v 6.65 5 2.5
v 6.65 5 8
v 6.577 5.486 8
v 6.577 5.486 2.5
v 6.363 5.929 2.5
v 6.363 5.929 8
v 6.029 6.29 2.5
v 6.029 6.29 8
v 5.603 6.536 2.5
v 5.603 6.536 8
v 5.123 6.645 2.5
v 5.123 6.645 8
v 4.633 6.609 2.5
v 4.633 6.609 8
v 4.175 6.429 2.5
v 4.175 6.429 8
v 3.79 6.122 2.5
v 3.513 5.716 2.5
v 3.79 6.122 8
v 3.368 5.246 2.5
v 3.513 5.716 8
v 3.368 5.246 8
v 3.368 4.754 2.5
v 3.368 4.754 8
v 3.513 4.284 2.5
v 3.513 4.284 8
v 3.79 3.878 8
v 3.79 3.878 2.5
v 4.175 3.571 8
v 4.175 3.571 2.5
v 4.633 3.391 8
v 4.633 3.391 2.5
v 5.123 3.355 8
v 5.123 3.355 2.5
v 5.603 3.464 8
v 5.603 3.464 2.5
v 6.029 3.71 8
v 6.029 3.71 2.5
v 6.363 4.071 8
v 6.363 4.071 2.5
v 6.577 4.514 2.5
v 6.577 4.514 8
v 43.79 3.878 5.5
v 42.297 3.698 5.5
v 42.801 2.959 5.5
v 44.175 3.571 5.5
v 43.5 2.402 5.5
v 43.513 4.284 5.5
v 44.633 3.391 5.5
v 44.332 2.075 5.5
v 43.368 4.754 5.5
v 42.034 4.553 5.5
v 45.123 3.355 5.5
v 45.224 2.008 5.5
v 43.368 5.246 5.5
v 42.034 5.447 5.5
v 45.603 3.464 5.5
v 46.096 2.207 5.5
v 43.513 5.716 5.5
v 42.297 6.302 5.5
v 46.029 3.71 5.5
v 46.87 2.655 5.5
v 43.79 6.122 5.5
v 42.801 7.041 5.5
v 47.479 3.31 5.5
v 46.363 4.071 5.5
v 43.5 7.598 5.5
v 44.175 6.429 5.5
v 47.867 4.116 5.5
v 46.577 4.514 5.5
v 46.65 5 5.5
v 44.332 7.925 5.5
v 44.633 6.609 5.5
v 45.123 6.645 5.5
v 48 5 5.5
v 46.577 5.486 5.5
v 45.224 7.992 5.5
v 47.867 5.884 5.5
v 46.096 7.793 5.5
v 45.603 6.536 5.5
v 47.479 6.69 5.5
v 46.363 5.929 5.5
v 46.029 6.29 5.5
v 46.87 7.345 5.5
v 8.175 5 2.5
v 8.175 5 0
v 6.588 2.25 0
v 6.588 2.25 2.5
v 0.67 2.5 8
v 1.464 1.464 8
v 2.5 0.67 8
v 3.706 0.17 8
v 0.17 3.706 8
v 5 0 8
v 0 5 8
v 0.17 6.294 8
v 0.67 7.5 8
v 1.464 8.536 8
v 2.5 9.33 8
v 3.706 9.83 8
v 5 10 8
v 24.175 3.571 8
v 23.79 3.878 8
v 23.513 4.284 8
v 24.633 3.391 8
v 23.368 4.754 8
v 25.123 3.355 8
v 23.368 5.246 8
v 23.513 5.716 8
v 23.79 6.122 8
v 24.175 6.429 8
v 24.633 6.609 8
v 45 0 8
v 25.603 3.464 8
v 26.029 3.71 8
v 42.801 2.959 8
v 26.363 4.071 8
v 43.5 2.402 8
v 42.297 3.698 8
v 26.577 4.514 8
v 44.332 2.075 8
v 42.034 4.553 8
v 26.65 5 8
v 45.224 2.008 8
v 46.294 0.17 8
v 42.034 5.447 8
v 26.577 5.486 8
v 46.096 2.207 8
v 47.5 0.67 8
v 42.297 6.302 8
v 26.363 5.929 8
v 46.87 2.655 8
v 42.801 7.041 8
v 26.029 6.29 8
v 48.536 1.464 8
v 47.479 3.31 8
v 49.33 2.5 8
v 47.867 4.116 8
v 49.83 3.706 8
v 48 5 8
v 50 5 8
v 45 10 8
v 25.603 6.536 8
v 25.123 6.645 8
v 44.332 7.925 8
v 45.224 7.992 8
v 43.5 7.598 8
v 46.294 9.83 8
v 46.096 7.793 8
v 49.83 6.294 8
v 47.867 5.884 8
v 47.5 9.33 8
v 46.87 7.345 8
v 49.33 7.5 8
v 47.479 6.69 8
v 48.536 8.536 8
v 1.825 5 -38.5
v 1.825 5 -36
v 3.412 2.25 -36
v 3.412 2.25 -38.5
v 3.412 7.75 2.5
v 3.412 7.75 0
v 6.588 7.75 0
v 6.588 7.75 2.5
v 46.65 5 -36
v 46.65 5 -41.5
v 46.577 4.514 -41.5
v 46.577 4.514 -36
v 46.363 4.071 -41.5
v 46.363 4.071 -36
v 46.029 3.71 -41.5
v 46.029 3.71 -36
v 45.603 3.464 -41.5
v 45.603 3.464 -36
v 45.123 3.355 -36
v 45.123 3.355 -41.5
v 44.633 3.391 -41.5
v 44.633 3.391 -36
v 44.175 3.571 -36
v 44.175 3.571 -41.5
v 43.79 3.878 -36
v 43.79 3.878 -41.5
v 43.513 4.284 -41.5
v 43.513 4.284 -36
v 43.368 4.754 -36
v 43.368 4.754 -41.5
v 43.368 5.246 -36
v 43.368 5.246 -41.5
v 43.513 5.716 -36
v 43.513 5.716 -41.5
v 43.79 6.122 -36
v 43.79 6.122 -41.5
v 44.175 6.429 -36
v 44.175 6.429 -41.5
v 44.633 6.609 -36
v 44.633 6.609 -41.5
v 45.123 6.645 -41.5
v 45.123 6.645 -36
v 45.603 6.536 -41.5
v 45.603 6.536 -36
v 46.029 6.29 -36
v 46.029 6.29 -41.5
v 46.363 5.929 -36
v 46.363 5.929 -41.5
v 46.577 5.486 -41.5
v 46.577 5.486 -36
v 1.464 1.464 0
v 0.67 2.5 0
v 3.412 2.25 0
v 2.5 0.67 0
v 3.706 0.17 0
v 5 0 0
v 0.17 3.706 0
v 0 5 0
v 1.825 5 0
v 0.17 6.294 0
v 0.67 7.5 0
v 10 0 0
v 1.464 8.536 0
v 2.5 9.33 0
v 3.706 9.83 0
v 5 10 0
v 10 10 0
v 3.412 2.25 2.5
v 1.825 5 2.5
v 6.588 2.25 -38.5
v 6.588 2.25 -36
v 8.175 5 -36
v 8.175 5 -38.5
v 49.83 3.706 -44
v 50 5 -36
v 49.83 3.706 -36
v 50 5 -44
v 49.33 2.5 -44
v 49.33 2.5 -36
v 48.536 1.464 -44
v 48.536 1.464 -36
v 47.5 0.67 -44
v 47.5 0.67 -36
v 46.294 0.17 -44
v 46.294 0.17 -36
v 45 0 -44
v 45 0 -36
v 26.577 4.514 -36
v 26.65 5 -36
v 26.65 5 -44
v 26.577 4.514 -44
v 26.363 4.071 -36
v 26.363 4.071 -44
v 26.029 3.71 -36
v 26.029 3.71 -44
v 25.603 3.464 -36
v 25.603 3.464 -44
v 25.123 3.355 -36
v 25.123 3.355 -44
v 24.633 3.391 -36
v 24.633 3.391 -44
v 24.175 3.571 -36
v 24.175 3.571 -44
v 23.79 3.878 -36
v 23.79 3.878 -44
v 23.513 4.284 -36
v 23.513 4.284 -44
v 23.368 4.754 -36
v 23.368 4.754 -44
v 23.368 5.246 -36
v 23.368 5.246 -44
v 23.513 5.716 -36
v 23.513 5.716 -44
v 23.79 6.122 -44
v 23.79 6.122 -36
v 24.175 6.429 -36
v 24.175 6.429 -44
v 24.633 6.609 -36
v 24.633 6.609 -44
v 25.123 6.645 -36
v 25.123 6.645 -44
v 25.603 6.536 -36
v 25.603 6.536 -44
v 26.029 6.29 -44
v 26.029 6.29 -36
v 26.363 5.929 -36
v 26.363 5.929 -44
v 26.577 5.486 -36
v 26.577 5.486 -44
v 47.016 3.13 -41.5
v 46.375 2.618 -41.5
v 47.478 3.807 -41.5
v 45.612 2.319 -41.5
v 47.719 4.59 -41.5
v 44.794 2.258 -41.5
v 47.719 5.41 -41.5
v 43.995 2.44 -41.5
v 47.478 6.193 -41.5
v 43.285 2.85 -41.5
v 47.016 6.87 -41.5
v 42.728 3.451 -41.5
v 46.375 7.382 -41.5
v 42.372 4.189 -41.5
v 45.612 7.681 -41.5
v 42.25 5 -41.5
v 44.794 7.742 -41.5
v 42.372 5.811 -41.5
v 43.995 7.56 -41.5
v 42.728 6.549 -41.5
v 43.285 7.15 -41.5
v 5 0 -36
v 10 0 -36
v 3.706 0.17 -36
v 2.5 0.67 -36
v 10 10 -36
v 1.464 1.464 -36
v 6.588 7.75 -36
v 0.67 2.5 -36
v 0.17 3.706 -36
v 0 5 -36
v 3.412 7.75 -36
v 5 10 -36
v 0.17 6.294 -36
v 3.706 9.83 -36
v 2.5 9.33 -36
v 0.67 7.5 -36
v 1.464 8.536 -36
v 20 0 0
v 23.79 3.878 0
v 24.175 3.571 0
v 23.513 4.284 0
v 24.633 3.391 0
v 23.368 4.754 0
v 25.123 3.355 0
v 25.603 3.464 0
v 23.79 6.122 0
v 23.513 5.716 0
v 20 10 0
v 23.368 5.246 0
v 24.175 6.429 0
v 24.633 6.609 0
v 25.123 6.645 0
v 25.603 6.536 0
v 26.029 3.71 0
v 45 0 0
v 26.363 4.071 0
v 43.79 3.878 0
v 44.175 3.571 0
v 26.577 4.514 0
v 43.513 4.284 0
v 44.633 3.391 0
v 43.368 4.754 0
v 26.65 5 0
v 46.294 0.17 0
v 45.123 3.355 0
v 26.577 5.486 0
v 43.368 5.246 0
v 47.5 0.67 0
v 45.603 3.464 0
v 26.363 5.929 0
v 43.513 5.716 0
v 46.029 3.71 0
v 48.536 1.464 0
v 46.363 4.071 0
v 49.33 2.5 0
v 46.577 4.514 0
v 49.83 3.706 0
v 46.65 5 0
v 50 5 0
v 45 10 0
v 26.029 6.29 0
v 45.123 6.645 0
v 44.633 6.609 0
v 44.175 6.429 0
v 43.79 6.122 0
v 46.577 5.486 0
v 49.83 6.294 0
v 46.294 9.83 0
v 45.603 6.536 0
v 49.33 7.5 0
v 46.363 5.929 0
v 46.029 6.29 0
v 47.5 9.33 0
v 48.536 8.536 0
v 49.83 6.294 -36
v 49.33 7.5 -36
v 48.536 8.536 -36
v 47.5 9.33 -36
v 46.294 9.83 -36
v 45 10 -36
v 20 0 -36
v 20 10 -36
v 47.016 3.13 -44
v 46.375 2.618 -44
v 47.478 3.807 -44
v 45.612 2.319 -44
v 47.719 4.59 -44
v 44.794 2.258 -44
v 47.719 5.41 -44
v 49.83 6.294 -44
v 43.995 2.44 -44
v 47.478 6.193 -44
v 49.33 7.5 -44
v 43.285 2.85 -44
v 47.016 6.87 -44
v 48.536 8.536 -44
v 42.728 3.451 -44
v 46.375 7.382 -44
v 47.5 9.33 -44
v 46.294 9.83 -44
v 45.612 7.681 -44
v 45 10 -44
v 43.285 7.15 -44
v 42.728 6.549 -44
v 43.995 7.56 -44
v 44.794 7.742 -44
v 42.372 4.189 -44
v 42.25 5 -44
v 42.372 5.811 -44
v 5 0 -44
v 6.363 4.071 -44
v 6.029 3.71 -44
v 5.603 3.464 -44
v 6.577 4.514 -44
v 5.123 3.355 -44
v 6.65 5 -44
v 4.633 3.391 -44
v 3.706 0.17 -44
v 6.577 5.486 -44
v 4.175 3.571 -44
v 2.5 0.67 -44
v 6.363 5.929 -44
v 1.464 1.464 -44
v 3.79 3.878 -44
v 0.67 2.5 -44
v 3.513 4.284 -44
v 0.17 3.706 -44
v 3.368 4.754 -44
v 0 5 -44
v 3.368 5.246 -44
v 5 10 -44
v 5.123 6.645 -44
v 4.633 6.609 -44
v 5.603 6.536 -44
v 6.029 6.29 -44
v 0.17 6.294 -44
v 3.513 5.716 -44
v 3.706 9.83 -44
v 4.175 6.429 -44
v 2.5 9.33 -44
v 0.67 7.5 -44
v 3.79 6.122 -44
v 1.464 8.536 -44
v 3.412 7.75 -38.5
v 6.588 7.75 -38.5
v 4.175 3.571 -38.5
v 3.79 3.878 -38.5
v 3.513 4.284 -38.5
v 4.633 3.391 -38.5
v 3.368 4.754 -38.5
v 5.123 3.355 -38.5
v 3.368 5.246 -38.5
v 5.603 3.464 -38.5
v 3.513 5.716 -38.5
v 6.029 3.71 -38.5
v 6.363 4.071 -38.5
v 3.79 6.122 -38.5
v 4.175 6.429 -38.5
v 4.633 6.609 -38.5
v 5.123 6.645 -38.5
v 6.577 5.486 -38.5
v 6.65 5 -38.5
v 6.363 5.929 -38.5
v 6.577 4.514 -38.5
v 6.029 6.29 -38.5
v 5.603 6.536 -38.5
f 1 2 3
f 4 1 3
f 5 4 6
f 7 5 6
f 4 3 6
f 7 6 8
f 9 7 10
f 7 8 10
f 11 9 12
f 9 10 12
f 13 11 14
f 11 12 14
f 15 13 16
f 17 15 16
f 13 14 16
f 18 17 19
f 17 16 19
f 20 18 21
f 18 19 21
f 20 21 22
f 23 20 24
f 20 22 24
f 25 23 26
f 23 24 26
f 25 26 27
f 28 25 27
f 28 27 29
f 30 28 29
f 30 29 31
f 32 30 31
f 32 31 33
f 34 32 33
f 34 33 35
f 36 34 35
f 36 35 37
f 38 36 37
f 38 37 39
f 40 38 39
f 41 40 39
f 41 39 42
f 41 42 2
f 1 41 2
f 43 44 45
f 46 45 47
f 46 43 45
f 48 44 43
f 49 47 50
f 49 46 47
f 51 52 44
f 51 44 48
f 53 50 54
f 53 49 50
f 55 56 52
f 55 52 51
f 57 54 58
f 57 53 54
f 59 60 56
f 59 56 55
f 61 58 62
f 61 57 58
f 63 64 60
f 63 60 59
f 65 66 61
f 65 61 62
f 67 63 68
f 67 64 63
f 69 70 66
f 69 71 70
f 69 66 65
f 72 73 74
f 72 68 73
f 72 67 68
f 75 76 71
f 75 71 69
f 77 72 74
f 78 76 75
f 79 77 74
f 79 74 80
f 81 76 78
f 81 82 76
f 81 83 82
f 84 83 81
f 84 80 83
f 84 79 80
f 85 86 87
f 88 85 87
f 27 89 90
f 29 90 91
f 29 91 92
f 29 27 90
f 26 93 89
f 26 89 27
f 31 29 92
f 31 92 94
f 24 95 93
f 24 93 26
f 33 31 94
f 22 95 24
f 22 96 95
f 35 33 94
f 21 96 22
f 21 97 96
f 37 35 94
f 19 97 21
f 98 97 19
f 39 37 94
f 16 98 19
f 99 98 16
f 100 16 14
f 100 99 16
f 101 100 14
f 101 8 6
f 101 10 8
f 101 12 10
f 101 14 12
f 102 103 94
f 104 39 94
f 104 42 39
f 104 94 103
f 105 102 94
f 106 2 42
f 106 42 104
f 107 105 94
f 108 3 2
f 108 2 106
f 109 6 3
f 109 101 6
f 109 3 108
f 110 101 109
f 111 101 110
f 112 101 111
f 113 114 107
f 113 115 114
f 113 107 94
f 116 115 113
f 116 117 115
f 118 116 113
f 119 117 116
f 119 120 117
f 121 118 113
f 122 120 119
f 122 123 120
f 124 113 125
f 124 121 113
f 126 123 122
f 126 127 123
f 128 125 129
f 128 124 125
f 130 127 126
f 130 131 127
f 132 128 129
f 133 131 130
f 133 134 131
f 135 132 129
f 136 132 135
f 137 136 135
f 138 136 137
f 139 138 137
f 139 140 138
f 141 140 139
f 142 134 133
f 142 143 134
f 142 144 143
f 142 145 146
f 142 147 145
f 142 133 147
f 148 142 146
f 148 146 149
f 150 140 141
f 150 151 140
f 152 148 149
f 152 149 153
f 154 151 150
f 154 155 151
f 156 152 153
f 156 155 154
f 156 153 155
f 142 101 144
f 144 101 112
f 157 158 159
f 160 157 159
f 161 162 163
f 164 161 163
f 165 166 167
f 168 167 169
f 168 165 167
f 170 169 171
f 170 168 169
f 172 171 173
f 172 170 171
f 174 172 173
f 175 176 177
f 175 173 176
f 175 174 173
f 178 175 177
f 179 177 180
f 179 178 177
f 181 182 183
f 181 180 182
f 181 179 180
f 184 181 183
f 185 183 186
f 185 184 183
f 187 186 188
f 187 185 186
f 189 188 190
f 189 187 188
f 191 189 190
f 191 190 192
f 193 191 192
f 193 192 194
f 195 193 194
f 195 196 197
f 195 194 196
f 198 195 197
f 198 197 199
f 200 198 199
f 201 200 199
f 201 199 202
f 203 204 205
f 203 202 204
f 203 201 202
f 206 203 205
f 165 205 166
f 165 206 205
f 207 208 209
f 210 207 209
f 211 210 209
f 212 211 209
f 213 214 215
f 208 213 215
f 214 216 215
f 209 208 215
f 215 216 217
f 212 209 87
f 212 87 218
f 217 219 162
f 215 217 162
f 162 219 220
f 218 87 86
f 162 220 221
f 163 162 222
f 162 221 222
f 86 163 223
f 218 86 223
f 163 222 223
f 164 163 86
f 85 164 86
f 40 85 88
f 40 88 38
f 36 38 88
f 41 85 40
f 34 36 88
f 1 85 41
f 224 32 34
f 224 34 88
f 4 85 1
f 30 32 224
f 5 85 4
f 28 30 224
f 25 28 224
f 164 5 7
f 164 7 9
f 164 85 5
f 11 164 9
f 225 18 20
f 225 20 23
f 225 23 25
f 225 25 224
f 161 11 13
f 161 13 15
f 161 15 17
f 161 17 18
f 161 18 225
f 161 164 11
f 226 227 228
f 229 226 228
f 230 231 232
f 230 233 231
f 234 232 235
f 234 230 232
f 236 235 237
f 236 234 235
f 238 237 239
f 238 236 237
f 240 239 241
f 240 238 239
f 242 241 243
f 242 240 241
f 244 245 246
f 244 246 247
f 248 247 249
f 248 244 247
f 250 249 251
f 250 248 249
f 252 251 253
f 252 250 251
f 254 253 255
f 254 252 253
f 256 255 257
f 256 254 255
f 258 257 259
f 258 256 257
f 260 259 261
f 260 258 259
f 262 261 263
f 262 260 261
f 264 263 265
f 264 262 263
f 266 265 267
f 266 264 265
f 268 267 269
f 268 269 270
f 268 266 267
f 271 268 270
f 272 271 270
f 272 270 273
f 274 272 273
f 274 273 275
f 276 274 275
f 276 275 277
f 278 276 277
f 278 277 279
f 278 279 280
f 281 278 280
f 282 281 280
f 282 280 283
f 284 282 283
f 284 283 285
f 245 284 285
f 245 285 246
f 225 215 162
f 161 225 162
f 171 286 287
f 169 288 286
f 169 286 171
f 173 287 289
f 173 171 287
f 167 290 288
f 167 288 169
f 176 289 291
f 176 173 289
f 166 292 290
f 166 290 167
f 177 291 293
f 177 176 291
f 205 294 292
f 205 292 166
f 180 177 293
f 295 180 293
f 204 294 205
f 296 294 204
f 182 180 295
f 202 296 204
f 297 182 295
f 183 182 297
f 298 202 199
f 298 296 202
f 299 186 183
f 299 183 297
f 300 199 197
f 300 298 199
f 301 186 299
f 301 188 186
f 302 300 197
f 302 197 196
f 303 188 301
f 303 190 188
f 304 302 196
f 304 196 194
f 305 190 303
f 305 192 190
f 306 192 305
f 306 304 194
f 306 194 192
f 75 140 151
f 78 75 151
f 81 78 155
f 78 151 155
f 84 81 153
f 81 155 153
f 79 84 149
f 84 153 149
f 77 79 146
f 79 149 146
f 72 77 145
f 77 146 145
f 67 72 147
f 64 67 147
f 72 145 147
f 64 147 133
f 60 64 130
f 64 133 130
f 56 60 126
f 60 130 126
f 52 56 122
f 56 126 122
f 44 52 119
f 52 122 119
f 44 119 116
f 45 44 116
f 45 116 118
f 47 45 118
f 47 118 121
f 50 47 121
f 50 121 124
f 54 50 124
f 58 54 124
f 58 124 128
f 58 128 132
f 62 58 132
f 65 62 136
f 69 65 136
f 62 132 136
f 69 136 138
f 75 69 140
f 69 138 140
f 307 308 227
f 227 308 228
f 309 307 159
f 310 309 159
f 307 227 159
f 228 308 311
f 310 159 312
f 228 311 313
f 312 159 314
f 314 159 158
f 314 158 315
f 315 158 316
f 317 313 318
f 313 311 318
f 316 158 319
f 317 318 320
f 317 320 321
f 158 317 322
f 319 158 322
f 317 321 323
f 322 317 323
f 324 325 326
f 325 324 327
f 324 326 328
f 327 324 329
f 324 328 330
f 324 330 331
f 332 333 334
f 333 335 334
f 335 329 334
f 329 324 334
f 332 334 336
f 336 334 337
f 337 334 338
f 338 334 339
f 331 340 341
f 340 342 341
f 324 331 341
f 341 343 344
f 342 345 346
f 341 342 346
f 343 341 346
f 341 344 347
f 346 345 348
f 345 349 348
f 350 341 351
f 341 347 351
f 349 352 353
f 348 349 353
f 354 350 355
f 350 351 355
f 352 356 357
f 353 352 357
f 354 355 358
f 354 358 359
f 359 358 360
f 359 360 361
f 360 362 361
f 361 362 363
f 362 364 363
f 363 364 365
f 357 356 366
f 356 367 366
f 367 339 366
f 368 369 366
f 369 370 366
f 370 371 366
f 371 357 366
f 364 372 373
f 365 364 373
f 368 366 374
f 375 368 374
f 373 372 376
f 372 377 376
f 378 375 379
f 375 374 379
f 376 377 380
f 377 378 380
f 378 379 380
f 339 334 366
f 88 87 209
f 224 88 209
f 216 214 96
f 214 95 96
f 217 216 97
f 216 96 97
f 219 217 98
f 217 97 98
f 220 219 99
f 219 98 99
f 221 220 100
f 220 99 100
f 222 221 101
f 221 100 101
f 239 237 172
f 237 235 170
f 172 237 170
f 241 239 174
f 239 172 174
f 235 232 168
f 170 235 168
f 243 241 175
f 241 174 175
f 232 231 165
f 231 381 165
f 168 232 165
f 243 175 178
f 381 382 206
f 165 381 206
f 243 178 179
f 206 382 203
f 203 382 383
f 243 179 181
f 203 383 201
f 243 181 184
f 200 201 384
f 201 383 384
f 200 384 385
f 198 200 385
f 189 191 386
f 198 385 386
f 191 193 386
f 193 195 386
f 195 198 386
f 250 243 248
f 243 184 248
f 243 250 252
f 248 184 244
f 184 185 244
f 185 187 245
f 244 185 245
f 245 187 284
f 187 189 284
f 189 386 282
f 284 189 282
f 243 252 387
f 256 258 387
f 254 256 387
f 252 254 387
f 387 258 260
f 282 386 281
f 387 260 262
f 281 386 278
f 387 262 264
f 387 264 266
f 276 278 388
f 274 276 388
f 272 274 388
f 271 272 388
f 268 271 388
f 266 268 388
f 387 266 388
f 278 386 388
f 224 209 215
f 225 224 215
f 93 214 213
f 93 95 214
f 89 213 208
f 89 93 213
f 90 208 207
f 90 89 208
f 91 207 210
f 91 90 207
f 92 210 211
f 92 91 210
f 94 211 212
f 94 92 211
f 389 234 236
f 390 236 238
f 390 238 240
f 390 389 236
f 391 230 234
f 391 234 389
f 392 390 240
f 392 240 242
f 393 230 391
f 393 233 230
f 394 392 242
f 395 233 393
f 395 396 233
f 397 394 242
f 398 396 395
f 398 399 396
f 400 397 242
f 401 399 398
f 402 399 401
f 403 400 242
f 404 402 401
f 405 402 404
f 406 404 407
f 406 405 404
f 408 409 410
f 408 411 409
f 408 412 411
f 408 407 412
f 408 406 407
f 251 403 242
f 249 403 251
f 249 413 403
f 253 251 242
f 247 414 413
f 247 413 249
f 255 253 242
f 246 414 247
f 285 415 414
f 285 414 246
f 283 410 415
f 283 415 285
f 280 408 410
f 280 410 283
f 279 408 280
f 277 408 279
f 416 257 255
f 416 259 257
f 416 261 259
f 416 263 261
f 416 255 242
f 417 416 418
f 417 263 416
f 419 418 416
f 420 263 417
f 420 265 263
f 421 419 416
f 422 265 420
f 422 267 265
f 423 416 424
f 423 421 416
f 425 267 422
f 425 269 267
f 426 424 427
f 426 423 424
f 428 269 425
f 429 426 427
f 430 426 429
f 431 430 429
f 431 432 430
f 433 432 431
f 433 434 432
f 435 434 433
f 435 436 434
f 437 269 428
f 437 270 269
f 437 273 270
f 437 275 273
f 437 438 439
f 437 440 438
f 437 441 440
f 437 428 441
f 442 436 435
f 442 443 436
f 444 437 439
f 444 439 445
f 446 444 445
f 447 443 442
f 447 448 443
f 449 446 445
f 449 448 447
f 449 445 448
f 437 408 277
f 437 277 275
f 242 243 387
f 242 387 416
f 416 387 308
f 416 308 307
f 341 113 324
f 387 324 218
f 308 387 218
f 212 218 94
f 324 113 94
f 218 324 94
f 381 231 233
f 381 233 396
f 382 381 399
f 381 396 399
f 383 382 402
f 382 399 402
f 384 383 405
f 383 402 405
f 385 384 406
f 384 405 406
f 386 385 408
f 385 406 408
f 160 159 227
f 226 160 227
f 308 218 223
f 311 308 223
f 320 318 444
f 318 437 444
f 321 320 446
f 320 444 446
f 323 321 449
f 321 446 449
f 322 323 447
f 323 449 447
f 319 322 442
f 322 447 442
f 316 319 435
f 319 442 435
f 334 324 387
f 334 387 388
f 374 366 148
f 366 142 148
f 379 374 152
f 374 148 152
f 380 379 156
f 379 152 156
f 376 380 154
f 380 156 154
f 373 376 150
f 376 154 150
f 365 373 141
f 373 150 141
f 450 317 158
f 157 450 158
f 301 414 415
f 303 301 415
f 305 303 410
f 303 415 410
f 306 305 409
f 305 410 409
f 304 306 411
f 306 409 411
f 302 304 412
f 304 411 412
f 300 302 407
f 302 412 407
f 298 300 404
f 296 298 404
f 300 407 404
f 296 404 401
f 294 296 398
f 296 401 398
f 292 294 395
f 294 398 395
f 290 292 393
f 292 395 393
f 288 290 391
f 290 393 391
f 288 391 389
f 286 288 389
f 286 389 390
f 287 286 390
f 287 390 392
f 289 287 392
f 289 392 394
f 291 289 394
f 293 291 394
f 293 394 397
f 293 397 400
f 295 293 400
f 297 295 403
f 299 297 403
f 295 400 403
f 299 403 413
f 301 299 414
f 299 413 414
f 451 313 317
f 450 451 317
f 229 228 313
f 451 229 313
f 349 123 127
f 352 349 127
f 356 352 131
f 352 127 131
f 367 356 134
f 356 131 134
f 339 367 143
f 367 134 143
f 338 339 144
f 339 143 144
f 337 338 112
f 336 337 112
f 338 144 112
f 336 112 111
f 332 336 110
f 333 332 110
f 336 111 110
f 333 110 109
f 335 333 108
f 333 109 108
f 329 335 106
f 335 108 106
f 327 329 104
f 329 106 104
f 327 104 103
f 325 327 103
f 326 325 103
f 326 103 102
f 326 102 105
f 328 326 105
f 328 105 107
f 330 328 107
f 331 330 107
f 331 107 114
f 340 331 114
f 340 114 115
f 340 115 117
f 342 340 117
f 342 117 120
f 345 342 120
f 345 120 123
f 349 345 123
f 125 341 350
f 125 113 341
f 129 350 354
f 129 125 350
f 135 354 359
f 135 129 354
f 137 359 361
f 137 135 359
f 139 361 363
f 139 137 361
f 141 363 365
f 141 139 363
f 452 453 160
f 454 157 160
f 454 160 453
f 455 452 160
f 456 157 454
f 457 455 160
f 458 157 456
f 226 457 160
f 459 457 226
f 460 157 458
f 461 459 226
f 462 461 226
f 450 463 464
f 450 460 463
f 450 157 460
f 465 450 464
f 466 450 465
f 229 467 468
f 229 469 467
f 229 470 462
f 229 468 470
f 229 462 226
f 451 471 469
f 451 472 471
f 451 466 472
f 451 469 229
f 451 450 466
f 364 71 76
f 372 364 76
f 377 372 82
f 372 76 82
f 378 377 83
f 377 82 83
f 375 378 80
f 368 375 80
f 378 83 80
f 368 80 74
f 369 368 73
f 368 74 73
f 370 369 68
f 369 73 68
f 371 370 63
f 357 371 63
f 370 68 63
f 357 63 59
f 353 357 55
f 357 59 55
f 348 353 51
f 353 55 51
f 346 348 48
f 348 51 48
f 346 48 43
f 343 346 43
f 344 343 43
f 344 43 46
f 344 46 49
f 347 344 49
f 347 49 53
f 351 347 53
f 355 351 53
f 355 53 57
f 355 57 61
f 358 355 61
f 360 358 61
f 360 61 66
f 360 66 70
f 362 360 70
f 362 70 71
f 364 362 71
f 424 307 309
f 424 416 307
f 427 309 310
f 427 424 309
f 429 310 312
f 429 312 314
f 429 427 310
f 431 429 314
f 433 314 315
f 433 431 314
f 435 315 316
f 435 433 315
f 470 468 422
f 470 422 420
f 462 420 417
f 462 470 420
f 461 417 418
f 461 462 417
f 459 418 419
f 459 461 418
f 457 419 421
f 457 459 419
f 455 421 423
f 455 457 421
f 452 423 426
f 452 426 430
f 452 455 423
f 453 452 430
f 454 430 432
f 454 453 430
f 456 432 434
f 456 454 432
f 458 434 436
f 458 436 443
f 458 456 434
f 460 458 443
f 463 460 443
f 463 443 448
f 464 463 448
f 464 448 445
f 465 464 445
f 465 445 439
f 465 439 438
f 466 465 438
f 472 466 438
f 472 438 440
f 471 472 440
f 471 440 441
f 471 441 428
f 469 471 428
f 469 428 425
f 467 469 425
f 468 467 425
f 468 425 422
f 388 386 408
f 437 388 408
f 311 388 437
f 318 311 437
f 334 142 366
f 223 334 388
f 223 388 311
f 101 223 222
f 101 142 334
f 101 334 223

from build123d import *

# Parameters (mm, degrees)
SKICA1_W                 = 50
SKICA1_H                 = 10
P_IDAT_VYSUNUT_M1_DEPTH  = 8
SKICA2_R                 = 1.65
ODEBRAT_VYSUNUT_M1_DEPTH = 52.613951602
ZAOBLIT2_R               = 5
SKICA4_R                 = 1.65
ODEBRAT_VYSUNUT_M2_DEPTH = 10
ODEBRAT_VYSUNUT_M3_DEPTH = 2.5
SKICA6_R                 = 3
ODEBRAT_VYSUNUT_M4_DEPTH = 2.5
SKICA7_W                 = 10
SKICA7_H                 = 10
P_IDAT_VYSUNUT_M2_DEPTH  = 36
SKICA8_W                 = 50
SKICA8_H                 = 10
P_IDAT_VYSUNUT_M3_DEPTH  = 8
ZAOBLIT3_R               = 5
ODEBRAT_START            = -8
SKICA9_R                 = 1.65
ODEBRAT_VYSUNUT_M5_DEPTH = 8
SKICA10_R                = 2.75
ODEBRAT_VYSUNUT_M6_DEPTH = 2.5
ODEBRAT_VYSUNUT_M7_DEPTH = 2.5
ODEBRAT_START_2          = -36
SKICA12_R                = 1.65
ODEBRAT_VYSUNUT_M8_DEPTH = 36


with BuildPart() as part:
    # Skica1 → Přidat vysunutím1 (new body)
    with BuildSketch(Plane.XY):
        with Locations((25, 5)):
            Rectangle(SKICA1_W, SKICA1_H)
    extrude(amount=P_IDAT_VYSUNUT_M1_DEPTH)

    # Skica2 → Odebrat vysunutím1 (cut, through all)
    with BuildSketch(Plane.XY.offset(8)):
        with Locations((5, 5)):
            Circle(SKICA2_R)
        with Locations((45, 5)):
            Circle(SKICA2_R)
    extrude(amount=-ODEBRAT_VYSUNUT_M1_DEPTH, mode=Mode.SUBTRACT)

    # Zaoblit2
    zaoblit2_edges = [part.edges().sort_by_distance(p)[0] for p in [
        (50, 0, 4),
        (50, 10, 4),
        (0, 0, 4),
        (0, 10, 4),
    ]]
    fillet(zaoblit2_edges, radius=ZAOBLIT2_R - 0.0001)  # a hair under: the kernel refuses the full size

    # Skica4 → Odebrat vysunutím2 (cut)
    with BuildSketch(Plane.XY.offset(8)):
        with Locations((25, 5)):
            Circle(SKICA4_R)
    extrude(amount=-ODEBRAT_VYSUNUT_M2_DEPTH, mode=Mode.SUBTRACT)

    # Skica5 → Odebrat vysunutím3 (cut)
    with BuildSketch(Plane(origin=(0, 0, 0), x_dir=(-1, 0, 0), z_dir=(0, 0, -1))):
        Polygon((-1.824573519, 5), (-3.41228676, 7.75), (-6.58771324, 7.75), (-8.175426481, 5), (-6.58771324, 2.25), (-3.41228676, 2.25), align=None)
    extrude(amount=-ODEBRAT_VYSUNUT_M3_DEPTH, mode=Mode.SUBTRACT)

    # Skica6 → Odebrat vysunutím4 (cut)
    with BuildSketch(Plane.XY.offset(8)):
        with Locations((45, 5)):
            Circle(SKICA6_R)
    extrude(amount=-ODEBRAT_VYSUNUT_M4_DEPTH, mode=Mode.SUBTRACT)

    # Skica7 → Přidat vysunutím2 (add)
    with BuildSketch(Plane(origin=(0, 0, 0), x_dir=(-1, 0, 0), z_dir=(0, 0, -1))):
        with Locations((-15, 5)):
            Rectangle(SKICA7_W, SKICA7_H)
    extrude(amount=P_IDAT_VYSUNUT_M2_DEPTH)

    # Skica8 → Přidat vysunutím3 (add)
    with BuildSketch(Plane(origin=(0, 0, -36), x_dir=(-1, 0, 0), z_dir=(0, 0, -1))):
        with Locations((-25, 5)):
            Rectangle(SKICA8_W, SKICA8_H)
    extrude(amount=P_IDAT_VYSUNUT_M3_DEPTH)

    # Zaoblit3
    zaoblit3_edges = [part.edges().sort_by_distance(p)[0] for p in [
        (0, 0, -40),
        (0, 10, -40),
        (50, 0, -40),
        (50, 10, -40),
    ]]
    fillet(zaoblit3_edges, radius=ZAOBLIT3_R - 0.0001)  # a hair under: the kernel refuses the full size

    # Skica9 → Odebrat vysunutím5 (cut)
    with BuildSketch(Plane(origin=(0, 0, -44), x_dir=(-1, 0, 0), z_dir=(0, 0, -1)).offset(ODEBRAT_START)):
        with Locations(Location((-45, 5, 0), (0, 0, 180))):
            Circle(SKICA9_R)
        with Locations(Location((-5, 5, 0), (0, 0, 180))):
            Circle(SKICA9_R)
    extrude(amount=ODEBRAT_VYSUNUT_M5_DEPTH, mode=Mode.SUBTRACT)

    # Skica10 → Odebrat vysunutím6 (cut)
    with BuildSketch(Plane(origin=(0, 0, -44), x_dir=(-1, 0, 0), z_dir=(0, 0, -1))):
        with Locations((-45, 5)):
            Circle(SKICA10_R)
    extrude(amount=-ODEBRAT_VYSUNUT_M6_DEPTH, mode=Mode.SUBTRACT)

    # Skica11 → Odebrat vysunutím7 (cut)
    with BuildSketch(Plane.XY.offset(-36)):
        Polygon((1.824573519, 5), (3.41228676, 2.25), (6.58771324, 2.25), (8.175426481, 5), (6.58771324, 7.75), (3.41228676, 7.75), align=None)
    extrude(amount=-ODEBRAT_VYSUNUT_M7_DEPTH, mode=Mode.SUBTRACT)

    # Skica12 → Odebrat vysunutím8 (cut)
    with BuildSketch(Plane(origin=(0, 0, -44), x_dir=(-1, 0, 0), z_dir=(0, 0, -1)).offset(ODEBRAT_START_2)):
        with Locations(Location((-25, 5, 0), (0, 0, 180))):
            Circle(SKICA12_R)
    extrude(amount=ODEBRAT_VYSUNUT_M8_DEPTH, mode=Mode.SUBTRACT)


solid = part.part
